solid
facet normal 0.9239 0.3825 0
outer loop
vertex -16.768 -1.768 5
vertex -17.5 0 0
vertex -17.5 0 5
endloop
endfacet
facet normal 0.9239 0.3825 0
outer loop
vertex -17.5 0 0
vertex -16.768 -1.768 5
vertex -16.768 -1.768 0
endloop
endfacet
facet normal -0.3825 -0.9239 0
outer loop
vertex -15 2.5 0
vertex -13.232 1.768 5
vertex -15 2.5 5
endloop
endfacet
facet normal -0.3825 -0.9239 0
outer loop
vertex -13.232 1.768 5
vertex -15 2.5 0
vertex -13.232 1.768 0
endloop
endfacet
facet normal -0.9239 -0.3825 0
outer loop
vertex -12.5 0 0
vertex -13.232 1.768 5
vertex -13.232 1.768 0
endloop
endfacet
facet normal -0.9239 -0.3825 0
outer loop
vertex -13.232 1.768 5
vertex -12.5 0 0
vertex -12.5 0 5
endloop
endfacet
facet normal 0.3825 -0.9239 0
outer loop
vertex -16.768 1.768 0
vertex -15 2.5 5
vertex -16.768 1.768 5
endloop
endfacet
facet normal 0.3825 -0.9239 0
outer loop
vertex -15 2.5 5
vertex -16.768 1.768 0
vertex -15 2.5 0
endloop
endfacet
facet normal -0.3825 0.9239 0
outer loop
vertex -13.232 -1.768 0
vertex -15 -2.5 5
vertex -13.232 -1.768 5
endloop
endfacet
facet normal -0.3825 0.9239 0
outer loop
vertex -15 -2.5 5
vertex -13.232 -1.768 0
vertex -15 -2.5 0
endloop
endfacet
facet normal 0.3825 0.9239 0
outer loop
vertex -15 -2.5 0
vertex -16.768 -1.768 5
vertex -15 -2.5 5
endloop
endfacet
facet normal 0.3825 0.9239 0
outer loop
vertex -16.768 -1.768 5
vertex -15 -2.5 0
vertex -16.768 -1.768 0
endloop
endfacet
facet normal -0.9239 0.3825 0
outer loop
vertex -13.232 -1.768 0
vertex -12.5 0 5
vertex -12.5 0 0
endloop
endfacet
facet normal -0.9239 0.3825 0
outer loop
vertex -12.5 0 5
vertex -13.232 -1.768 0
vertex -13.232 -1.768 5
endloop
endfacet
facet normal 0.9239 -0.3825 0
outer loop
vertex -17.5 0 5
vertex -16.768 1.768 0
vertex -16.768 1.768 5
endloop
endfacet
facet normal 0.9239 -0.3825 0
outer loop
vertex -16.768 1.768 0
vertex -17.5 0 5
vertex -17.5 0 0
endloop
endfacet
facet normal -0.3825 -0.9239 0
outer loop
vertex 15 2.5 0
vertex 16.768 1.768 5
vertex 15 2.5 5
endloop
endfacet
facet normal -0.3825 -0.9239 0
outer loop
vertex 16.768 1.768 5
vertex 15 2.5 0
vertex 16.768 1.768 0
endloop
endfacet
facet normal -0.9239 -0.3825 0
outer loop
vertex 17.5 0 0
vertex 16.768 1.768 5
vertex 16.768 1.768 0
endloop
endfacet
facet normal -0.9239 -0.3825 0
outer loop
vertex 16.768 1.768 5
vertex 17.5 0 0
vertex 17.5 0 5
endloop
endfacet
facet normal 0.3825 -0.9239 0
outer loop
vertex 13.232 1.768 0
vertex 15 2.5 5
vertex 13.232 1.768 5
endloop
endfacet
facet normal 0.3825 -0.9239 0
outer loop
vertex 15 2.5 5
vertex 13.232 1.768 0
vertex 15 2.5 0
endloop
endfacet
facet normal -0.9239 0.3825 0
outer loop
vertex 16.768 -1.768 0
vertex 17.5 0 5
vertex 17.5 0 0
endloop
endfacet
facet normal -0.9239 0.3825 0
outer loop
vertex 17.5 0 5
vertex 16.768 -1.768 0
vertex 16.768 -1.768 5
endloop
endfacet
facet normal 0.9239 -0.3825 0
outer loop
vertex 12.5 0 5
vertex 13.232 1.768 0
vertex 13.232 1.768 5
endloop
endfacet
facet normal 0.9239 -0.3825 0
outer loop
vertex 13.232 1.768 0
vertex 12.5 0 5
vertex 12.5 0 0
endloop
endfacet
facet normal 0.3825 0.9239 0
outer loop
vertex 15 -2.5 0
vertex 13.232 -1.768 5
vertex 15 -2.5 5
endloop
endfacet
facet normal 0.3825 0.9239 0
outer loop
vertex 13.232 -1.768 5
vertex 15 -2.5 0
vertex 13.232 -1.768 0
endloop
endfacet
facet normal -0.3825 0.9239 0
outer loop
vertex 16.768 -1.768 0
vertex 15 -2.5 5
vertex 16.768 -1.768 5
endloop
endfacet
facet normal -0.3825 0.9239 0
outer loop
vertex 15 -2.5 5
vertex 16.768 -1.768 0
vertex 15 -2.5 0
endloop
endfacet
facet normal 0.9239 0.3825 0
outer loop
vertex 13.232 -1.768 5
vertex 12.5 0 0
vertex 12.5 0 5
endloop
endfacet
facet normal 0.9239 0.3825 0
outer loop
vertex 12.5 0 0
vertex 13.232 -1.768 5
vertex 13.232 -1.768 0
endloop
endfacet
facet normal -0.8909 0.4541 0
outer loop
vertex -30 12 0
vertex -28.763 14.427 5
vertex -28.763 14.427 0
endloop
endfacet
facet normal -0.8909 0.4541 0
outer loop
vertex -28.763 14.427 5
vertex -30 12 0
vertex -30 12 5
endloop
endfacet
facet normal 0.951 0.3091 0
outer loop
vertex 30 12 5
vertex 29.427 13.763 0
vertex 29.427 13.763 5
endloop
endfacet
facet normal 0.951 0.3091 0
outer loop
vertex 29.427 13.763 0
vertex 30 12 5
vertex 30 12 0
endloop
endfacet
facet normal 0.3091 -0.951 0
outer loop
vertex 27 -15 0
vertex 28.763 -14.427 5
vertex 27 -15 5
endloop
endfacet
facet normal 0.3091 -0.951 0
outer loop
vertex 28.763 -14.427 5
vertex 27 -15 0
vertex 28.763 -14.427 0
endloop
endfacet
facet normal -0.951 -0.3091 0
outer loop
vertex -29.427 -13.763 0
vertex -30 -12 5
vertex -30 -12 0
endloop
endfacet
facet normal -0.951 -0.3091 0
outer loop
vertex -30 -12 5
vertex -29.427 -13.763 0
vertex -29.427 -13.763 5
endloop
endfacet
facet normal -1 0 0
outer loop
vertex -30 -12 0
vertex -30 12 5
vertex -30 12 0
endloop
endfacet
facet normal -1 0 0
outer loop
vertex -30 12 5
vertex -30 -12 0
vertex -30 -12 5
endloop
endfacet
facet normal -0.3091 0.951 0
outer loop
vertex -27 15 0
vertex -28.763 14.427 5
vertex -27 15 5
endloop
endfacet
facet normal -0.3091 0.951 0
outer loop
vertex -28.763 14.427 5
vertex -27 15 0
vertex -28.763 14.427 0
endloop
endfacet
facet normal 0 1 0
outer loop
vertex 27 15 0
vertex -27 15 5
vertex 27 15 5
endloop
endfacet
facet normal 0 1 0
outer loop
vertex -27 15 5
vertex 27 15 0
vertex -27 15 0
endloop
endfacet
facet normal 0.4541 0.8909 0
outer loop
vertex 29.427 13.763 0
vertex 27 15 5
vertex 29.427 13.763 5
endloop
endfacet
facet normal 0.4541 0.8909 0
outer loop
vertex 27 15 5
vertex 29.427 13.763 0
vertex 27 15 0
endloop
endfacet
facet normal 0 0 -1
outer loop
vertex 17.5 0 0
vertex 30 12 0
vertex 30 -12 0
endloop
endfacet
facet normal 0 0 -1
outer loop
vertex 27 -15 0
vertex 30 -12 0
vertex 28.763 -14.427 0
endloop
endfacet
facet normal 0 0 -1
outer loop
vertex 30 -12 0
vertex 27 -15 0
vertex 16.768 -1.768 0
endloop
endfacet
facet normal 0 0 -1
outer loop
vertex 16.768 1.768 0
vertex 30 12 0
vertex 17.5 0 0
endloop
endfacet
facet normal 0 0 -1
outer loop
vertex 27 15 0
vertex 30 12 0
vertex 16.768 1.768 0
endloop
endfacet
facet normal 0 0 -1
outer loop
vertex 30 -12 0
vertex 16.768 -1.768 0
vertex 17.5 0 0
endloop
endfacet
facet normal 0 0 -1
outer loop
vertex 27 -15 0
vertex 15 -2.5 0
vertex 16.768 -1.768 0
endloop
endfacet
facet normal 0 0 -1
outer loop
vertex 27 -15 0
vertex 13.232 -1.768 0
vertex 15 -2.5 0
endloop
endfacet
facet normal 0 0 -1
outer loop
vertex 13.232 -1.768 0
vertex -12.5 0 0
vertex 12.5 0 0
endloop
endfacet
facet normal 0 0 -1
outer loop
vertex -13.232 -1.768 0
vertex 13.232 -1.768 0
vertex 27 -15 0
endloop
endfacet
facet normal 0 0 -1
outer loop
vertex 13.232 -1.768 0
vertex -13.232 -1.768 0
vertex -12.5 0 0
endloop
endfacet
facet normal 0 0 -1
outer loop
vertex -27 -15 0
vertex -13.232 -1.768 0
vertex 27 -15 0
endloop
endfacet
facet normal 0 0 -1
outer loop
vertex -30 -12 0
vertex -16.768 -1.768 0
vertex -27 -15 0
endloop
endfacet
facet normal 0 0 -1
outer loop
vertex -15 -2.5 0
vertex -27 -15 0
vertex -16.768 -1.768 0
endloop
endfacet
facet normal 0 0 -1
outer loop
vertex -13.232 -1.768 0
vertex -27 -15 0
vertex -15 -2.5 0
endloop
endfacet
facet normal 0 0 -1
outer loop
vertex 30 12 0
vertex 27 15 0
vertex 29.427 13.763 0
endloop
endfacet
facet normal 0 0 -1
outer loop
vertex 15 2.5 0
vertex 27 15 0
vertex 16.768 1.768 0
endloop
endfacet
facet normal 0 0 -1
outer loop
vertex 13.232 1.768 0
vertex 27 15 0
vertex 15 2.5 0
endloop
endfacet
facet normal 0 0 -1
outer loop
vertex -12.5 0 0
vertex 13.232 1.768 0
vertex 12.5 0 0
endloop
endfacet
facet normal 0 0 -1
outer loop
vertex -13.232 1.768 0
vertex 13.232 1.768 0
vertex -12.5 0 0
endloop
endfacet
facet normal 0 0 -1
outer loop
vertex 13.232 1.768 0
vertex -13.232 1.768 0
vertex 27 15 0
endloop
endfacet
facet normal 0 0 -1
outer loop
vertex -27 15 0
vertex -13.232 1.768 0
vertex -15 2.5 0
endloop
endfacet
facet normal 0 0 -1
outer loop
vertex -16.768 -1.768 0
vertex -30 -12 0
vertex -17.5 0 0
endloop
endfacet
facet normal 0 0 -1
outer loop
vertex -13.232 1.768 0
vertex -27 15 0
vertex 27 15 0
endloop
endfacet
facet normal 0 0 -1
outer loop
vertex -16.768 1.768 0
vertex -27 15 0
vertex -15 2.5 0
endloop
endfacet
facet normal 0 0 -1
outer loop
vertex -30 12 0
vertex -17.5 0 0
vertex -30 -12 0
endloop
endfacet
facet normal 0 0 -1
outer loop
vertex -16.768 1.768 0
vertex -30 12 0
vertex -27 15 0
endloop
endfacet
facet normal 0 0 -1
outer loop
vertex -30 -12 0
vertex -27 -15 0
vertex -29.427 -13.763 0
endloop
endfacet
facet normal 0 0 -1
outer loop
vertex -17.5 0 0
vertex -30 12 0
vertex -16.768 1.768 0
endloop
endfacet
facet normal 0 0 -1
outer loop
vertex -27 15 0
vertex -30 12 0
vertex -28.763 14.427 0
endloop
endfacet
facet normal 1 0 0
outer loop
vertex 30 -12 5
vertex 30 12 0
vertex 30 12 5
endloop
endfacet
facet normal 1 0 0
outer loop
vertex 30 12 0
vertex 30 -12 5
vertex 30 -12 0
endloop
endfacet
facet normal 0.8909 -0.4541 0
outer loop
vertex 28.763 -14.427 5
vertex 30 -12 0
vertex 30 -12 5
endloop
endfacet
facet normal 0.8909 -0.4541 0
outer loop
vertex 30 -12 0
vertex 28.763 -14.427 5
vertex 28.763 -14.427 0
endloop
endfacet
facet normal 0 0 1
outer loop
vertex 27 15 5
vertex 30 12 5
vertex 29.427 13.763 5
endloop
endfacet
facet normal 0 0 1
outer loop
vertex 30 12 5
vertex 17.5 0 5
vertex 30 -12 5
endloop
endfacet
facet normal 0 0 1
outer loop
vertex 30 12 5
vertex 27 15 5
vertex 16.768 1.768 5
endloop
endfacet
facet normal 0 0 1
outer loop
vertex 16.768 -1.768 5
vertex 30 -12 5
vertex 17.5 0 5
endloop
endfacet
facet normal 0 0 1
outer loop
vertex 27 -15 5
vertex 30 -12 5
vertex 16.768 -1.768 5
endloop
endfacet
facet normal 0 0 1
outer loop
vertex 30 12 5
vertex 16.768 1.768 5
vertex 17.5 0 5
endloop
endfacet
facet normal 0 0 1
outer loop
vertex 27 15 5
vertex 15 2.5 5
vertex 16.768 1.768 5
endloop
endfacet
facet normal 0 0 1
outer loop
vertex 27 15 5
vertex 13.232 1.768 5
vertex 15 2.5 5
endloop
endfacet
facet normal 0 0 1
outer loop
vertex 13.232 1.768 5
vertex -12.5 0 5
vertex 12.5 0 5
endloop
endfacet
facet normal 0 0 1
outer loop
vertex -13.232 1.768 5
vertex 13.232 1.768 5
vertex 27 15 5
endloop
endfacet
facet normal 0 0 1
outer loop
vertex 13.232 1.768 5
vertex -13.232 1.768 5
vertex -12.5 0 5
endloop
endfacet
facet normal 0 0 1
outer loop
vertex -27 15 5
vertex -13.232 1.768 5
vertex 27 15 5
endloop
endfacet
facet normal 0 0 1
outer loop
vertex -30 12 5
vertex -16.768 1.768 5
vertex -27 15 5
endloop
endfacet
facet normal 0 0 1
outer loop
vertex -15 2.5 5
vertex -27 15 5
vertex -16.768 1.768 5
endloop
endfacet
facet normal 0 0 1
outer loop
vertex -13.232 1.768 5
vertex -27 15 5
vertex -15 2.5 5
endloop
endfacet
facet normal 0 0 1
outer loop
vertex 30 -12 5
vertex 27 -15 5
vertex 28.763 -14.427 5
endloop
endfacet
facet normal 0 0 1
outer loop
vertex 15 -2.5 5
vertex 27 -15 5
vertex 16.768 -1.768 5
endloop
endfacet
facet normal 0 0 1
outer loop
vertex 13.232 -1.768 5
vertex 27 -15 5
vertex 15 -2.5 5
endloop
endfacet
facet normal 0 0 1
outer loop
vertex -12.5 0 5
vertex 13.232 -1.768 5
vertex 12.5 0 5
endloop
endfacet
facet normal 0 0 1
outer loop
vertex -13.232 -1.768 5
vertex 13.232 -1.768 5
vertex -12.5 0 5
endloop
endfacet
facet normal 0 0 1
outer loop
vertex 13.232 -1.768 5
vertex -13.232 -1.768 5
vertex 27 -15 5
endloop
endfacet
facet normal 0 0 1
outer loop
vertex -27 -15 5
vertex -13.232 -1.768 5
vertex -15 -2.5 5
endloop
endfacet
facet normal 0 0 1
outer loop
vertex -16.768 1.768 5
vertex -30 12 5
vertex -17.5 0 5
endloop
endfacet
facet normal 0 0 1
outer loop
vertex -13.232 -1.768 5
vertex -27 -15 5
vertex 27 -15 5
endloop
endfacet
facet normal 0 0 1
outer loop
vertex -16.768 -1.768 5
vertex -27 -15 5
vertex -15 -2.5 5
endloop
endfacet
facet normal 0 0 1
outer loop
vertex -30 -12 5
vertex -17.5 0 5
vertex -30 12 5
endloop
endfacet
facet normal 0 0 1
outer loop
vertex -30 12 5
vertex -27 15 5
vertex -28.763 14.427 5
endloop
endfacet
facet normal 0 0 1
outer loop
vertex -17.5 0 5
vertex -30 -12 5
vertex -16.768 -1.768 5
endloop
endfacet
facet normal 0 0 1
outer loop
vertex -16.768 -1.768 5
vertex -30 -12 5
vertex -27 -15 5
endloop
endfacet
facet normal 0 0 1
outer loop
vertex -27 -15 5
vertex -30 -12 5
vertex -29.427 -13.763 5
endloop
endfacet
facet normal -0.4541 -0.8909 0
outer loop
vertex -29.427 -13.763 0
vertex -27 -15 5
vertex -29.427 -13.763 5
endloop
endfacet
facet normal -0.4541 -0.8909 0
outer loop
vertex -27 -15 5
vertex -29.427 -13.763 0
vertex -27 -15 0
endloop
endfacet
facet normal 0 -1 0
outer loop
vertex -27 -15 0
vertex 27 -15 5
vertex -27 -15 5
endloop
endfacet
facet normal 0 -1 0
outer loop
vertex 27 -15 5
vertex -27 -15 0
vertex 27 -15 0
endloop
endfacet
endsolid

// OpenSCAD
// orcad: flat mounting plate with two through holes.
length = 60;
width = 30;
thickness = 5;
hole_diameter = 5;
hole_spacing = 30;
corner_radius = 3;

r = min(corner_radius, length / 2 - 0.01, width / 2 - 0.01);
difference() {
    linear_extrude(thickness)
        offset(r = r) square([length - 2 * r, width - 2 * r], center = true);
    for (x = [-hole_spacing / 2, hole_spacing / 2])
        translate([x, 0, -1]) cylinder(d = hole_diameter, h = thickness + 2);
}
